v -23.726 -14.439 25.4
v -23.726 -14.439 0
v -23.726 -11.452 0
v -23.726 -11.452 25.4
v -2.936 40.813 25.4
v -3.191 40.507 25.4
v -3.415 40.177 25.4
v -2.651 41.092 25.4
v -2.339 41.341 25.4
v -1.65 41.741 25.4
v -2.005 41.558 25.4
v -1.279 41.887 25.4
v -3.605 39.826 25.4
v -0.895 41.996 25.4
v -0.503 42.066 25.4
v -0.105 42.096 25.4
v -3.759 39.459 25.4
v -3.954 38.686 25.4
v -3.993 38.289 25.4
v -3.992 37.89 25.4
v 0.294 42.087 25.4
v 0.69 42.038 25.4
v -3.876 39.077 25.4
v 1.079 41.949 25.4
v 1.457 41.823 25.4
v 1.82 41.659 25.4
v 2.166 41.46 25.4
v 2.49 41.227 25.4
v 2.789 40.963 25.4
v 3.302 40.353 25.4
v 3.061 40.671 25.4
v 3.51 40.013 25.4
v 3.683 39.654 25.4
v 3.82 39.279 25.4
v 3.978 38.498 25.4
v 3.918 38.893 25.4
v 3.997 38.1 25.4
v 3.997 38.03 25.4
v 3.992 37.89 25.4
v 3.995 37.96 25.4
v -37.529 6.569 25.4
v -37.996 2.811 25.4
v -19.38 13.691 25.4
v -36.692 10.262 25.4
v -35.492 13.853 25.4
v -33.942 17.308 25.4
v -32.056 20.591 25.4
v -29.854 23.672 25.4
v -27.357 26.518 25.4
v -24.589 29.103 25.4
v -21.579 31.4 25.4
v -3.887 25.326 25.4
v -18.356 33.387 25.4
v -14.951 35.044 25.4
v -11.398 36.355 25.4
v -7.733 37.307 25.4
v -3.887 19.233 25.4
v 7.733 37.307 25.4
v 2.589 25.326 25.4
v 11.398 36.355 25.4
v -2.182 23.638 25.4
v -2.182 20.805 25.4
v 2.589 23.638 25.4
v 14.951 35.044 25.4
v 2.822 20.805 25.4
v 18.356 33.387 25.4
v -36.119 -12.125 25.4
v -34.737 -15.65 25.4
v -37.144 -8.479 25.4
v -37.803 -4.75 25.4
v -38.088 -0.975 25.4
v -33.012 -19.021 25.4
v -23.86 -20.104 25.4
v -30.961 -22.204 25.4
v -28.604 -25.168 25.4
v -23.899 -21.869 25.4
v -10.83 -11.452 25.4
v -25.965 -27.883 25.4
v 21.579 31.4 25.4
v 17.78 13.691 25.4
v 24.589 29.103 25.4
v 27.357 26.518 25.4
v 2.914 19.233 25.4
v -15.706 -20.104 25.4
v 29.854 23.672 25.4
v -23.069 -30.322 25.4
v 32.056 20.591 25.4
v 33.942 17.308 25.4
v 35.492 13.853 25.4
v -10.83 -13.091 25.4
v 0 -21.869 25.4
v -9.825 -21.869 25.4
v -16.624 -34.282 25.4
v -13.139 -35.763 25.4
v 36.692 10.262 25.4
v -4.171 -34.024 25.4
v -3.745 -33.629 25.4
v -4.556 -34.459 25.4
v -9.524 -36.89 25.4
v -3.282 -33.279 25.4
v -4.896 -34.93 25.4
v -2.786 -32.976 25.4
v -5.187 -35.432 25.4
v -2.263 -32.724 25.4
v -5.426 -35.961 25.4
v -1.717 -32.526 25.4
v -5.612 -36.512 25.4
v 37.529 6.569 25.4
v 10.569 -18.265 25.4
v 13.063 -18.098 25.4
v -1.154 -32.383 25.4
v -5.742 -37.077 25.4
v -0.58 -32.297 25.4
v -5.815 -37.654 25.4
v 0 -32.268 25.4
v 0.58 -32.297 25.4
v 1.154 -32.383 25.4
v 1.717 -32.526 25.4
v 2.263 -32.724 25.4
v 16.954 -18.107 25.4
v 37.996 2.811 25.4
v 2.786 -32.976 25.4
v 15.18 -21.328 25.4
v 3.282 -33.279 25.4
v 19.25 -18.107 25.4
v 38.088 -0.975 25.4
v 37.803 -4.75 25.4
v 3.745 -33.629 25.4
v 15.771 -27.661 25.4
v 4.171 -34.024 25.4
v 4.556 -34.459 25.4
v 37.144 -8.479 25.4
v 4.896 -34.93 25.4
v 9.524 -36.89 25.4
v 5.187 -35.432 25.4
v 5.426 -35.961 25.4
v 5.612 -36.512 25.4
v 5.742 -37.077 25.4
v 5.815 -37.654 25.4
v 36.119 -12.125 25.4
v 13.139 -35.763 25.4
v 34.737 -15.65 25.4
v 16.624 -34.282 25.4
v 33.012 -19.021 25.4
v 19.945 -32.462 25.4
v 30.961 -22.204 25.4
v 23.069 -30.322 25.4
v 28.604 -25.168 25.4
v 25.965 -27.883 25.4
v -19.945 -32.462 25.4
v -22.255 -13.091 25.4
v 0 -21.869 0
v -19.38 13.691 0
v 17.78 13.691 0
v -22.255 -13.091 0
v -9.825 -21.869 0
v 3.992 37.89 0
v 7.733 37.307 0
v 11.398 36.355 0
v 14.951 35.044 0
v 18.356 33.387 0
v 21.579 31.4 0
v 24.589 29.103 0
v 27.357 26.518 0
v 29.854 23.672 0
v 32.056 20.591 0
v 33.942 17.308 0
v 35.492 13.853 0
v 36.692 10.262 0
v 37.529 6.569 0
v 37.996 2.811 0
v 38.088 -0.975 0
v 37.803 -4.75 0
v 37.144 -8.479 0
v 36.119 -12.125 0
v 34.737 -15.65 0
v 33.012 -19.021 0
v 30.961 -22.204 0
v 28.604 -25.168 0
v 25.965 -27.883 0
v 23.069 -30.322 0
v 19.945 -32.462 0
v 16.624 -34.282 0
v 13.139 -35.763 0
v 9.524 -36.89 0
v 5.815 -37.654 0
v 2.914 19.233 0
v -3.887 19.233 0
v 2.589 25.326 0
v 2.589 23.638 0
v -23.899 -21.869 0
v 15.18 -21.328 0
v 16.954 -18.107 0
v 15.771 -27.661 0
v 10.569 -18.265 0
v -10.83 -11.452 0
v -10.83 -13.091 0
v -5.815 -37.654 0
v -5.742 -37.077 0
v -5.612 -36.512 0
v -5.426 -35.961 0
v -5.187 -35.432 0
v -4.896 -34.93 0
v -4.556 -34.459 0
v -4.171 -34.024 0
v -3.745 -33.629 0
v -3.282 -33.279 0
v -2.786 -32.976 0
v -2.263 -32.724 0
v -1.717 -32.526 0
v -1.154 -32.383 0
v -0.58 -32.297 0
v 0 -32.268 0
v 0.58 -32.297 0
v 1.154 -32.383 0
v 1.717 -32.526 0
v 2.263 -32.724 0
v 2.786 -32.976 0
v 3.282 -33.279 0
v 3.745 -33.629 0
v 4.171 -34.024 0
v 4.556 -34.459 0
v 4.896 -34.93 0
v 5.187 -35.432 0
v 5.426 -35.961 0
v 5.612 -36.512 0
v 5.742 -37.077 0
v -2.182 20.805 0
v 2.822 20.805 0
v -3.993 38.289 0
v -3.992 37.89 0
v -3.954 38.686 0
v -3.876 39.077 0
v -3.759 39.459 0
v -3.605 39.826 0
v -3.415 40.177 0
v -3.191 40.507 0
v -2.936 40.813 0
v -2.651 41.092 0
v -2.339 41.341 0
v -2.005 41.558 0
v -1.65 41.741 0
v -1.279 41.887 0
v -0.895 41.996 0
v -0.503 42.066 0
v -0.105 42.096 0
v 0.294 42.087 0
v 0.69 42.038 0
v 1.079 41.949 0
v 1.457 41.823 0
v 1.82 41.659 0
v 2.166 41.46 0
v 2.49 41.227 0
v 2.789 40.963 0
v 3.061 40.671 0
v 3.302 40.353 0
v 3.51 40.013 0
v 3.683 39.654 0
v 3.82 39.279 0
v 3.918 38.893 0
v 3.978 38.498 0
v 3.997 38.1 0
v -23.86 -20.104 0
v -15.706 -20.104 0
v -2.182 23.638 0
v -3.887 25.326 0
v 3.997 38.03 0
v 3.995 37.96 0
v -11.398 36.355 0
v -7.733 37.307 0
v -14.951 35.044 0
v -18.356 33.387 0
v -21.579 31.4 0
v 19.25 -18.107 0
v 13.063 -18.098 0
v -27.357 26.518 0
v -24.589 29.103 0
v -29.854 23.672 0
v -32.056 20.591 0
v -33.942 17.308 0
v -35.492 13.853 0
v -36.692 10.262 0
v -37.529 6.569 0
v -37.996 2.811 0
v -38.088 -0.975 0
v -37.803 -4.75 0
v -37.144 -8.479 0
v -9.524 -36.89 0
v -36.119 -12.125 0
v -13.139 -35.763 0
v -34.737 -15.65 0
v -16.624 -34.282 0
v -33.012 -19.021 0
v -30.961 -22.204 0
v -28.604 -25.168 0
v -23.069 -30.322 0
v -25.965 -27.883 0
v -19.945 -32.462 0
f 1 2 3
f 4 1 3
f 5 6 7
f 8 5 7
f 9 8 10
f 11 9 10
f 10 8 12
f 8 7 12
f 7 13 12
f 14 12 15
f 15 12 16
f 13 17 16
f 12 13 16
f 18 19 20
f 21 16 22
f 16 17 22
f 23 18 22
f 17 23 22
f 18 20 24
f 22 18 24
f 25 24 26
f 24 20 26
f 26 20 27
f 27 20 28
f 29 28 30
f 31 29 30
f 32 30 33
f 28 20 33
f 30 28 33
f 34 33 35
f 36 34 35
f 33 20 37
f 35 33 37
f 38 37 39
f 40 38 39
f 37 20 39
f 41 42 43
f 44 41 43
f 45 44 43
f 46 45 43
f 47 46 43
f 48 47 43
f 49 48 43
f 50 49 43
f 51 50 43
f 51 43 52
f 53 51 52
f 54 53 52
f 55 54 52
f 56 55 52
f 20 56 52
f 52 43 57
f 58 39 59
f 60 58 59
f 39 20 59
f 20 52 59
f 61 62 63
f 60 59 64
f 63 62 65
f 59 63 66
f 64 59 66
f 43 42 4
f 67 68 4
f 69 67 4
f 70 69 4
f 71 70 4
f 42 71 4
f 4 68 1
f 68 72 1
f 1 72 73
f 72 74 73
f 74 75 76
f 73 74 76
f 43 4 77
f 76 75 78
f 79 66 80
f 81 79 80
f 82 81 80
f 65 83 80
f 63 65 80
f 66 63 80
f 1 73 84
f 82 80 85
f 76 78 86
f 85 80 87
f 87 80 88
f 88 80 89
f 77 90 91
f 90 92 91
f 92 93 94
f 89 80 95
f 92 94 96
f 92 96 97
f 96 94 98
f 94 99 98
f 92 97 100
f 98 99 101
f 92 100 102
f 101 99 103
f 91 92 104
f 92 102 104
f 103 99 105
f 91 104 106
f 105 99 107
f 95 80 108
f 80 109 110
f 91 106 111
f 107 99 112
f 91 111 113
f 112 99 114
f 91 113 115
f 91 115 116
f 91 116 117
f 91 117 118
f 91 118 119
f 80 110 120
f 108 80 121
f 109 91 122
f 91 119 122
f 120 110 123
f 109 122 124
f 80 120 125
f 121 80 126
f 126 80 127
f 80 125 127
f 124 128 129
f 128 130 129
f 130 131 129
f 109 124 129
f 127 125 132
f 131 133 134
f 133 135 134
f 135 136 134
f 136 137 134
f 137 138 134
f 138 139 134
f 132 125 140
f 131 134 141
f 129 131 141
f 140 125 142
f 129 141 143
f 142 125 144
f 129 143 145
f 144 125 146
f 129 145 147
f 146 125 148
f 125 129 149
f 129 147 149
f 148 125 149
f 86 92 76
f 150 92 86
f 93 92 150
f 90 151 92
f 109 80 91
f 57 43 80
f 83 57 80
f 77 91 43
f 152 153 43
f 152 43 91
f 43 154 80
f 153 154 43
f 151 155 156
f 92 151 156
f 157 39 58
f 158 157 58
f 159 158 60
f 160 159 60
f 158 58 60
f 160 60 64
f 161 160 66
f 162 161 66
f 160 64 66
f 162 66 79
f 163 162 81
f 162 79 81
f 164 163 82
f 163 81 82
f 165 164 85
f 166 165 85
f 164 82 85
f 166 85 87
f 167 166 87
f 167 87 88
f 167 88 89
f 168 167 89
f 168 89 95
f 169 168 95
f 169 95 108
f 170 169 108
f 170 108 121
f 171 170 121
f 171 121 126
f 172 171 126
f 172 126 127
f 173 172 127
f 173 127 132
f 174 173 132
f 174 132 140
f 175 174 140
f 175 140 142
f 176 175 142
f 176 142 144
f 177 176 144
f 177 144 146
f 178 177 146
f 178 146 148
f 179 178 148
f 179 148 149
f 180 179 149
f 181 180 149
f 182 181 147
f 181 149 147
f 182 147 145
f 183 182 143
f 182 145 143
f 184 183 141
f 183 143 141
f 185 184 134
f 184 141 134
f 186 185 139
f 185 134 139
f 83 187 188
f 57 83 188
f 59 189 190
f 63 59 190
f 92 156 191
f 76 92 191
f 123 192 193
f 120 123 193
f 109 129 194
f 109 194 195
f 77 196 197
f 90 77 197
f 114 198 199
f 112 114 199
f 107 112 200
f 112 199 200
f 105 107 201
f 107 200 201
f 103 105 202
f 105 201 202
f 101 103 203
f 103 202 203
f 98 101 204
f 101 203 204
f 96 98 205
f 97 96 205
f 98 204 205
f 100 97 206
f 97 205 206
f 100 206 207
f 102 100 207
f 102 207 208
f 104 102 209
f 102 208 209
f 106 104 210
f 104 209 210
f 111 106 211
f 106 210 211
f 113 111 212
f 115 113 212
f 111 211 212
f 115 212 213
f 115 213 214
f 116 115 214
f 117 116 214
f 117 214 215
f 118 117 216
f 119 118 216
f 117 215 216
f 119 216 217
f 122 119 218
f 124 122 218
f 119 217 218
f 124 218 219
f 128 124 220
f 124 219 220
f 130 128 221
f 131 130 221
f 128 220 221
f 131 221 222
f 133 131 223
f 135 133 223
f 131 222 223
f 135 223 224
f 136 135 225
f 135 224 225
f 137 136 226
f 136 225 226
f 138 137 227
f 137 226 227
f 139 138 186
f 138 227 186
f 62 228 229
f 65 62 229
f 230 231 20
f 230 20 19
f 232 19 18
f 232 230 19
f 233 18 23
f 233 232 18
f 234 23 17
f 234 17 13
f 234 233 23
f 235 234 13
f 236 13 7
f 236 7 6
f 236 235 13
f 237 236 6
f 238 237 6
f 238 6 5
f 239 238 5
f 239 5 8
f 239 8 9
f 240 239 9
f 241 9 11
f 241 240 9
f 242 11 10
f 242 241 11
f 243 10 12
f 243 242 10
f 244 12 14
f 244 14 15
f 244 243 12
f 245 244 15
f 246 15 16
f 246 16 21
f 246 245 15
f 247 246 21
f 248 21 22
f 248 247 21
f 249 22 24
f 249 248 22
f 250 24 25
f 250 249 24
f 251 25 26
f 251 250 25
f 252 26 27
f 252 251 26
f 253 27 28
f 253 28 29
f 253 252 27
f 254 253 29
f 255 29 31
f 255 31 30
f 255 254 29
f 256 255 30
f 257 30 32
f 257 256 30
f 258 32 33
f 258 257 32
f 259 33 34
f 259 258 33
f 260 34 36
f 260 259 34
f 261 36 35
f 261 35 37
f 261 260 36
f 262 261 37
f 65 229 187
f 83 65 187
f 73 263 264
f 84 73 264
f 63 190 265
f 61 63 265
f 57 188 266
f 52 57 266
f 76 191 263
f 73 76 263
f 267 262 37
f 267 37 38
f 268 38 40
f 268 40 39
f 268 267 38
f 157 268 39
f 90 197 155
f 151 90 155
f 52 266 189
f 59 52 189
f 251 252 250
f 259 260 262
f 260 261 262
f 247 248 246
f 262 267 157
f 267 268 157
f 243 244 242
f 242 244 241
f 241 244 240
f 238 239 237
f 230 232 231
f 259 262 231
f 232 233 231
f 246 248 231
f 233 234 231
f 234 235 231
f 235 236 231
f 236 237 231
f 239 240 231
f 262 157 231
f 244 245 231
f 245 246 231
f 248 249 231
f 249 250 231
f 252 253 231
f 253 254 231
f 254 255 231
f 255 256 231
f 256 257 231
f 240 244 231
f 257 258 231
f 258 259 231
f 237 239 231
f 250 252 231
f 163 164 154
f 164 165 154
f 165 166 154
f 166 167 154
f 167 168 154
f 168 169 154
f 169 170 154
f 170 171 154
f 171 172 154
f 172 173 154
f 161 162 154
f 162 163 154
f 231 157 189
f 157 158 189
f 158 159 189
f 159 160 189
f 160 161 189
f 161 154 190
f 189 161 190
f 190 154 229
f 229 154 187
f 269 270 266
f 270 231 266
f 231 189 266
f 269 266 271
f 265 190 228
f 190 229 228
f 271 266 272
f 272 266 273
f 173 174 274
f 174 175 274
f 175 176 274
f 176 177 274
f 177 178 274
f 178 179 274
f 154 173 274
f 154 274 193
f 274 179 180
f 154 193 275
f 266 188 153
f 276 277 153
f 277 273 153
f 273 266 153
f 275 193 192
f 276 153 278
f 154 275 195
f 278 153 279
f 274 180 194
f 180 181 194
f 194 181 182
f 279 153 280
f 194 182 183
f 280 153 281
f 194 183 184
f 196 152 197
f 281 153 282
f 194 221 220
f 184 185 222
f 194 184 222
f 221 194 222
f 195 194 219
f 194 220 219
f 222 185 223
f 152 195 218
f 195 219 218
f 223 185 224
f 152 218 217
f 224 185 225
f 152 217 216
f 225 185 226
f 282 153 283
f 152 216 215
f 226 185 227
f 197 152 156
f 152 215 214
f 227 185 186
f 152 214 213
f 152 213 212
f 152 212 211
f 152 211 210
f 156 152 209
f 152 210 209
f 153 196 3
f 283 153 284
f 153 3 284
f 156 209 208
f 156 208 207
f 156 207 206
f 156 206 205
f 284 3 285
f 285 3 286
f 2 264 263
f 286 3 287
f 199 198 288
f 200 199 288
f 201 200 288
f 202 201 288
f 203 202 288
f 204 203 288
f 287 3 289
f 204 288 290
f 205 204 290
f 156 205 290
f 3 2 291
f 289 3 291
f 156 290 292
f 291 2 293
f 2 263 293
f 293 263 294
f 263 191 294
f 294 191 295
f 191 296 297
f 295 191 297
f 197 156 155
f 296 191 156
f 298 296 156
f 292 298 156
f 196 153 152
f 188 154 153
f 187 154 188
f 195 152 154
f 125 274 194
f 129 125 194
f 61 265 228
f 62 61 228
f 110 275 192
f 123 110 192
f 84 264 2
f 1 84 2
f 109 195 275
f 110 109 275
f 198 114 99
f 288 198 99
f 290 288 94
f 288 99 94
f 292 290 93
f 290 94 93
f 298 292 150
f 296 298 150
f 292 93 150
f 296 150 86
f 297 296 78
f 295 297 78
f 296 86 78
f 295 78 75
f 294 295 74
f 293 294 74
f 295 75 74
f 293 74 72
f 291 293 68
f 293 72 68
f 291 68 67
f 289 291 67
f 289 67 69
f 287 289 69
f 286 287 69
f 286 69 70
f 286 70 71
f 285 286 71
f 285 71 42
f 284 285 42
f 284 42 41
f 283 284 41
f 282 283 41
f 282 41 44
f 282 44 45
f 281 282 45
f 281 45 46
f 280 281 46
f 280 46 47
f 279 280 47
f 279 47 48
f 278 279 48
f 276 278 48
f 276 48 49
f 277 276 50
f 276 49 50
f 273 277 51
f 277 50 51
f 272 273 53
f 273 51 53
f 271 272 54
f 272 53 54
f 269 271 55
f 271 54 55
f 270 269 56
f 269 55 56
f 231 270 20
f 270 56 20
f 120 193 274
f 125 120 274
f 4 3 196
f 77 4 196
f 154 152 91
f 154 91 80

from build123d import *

# Parameters (mm, degrees)
F0_W      = 38.1
F0_H      = 25.4
F3_DEPTH  = 73.8923922181
F5_DEPTH  = 25.4
F7_DEPTH  = 25.4
F9_DEPTH  = 25.4
F11_DEPTH = 25.4
F13_DEPTH = 25.4


# Not quite as in the source:
# - ends of sketch curves that miss each other by under 0.0002 mm in the source are joined


with BuildPart() as f1:
    # F0 (on Front) → F1 (revolve)
    with BuildSketch(Plane.XZ):
        with Locations((19.05, 12.7)):
            Rectangle(F0_W, F0_H)
    revolve(axis=Axis((0, 0, 12.7), (0, 0, -1)))

    # F2 (on Top) → F3 (cut)
    with BuildSketch(Plane.XY):
        Polygon((-19.3802006543, 13.6906001717), (0, -21.8694005162), (17.7799984813, 13.6905994838), align=None)
    extrude(amount=F3_DEPTH, mode=Mode.SUBTRACT)

    # F4 (on face) → F5 (cut)
    with BuildSketch(Plane(origin=(0, 0, 0), x_dir=(1, 0, 0), z_dir=(0, 0, -1))):
        Polygon((-9.8248589784, 21.8694005162), (-23.8991640508, 21.8694005162), (-23.8595362753, 20.1035637146), (-15.7059820649, 20.1035637146), (-23.725675419, 14.439499937), (-23.725675419, 11.4520248026), (-10.8296805993, 11.4520248026), (-10.8296805993, 13.090708293), (-22.2545247525, 13.090708293), align=None)
    extrude(amount=-F5_DEPTH, mode=Mode.SUBTRACT)

    # F6 (on face) → F7 (cut)
    with BuildSketch(Plane(origin=(0, 0, 0), x_dir=(1, 0, 0), z_dir=(0, 0, -1))):
        Polygon((15.7712604851, 27.6608336717), (10.5691235512, 18.2647015899), (13.062780723, 18.0983748287), (15.1800094172, 21.327663213), (16.9541146606, 18.1070137769), (19.2498695105, 18.1070137769), align=None)
    extrude(amount=-F7_DEPTH, mode=Mode.SUBTRACT)

    # F8 (on face) → F9 (cut)
    with BuildSketch(Plane(origin=(0, 0, 0), x_dir=(1, 0, 0), z_dir=(0, 0, -1))):
        Polygon((2.8216354549, -20.8048354834), (2.9142363928, -19.2329455167), (-3.8865676615, -19.2329455167), (-3.8865676615, -25.3260713071), (2.5894464925, -25.3260713071), (2.5894464925, -23.6380007118), (-2.1816743538, -23.6380007118), (-2.1816743538, -20.8048354834), align=None)
    extrude(amount=-F9_DEPTH, mode=Mode.SUBTRACT)

    # F10 (on face) → F11 (cut)
    with BuildSketch(Plane(origin=(0, 0, 0), x_dir=(1, 0, 0), z_dir=(0, 0, -1))):
        with BuildLine():
            ThreePointArc((5.8152880434, 37.6535844904), (0, 38.1), (-5.8152880434, 37.6535844904))
            ThreePointArc((-5.8152880434, 37.6535844904), (0, 32.267602394), (5.8152880434, 37.6535844904))
        make_face()
        with BuildLine():
            ThreePointArc((5.8152880434, 37.6535844904), (5.8281186457, 37.8766283677), (5.832397606, 38.1))
            ThreePointArc((5.832397606, 38.1), (-0.2233716323, 43.9281186457), (-5.8152880434, 37.6535844904))
            ThreePointArc((-5.8152880434, 37.6535844904), (0, 38.1), (5.8152880434, 37.6535844904))
        make_face()
    extrude(amount=-F11_DEPTH, mode=Mode.SUBTRACT)

    # F12 (on face) → F13 (join)
    with BuildSketch(Plane(origin=(0, 0, 0), x_dir=(1, 0, 0), z_dir=(0, 0, -1))):
        with BuildLine():
            ThreePointArc((-3.9919458032, -37.8902938588), (0, -38.1), (3.9919458032, -37.8902938588))
            ThreePointArc((3.9919458032, -37.8902938588), (0, -34.1025498176), (-3.9919458032, -37.8902938588))
        make_face()
        with BuildLine():
            ThreePointArc((-3.9919458032, -37.8902938588), (-0.1048891842, -42.0960738507), (3.9974501824, -38.1))
            ThreePointArc((3.9974501824, -38.1), (3.9960738507, -37.9951108158), (3.9919458032, -37.8902938588))
            ThreePointArc((3.9919458032, -37.8902938588), (0, -38.1), (-3.9919458032, -37.8902938588))
        make_face()
    extrude(amount=-F13_DEPTH)


solid = f1.part
